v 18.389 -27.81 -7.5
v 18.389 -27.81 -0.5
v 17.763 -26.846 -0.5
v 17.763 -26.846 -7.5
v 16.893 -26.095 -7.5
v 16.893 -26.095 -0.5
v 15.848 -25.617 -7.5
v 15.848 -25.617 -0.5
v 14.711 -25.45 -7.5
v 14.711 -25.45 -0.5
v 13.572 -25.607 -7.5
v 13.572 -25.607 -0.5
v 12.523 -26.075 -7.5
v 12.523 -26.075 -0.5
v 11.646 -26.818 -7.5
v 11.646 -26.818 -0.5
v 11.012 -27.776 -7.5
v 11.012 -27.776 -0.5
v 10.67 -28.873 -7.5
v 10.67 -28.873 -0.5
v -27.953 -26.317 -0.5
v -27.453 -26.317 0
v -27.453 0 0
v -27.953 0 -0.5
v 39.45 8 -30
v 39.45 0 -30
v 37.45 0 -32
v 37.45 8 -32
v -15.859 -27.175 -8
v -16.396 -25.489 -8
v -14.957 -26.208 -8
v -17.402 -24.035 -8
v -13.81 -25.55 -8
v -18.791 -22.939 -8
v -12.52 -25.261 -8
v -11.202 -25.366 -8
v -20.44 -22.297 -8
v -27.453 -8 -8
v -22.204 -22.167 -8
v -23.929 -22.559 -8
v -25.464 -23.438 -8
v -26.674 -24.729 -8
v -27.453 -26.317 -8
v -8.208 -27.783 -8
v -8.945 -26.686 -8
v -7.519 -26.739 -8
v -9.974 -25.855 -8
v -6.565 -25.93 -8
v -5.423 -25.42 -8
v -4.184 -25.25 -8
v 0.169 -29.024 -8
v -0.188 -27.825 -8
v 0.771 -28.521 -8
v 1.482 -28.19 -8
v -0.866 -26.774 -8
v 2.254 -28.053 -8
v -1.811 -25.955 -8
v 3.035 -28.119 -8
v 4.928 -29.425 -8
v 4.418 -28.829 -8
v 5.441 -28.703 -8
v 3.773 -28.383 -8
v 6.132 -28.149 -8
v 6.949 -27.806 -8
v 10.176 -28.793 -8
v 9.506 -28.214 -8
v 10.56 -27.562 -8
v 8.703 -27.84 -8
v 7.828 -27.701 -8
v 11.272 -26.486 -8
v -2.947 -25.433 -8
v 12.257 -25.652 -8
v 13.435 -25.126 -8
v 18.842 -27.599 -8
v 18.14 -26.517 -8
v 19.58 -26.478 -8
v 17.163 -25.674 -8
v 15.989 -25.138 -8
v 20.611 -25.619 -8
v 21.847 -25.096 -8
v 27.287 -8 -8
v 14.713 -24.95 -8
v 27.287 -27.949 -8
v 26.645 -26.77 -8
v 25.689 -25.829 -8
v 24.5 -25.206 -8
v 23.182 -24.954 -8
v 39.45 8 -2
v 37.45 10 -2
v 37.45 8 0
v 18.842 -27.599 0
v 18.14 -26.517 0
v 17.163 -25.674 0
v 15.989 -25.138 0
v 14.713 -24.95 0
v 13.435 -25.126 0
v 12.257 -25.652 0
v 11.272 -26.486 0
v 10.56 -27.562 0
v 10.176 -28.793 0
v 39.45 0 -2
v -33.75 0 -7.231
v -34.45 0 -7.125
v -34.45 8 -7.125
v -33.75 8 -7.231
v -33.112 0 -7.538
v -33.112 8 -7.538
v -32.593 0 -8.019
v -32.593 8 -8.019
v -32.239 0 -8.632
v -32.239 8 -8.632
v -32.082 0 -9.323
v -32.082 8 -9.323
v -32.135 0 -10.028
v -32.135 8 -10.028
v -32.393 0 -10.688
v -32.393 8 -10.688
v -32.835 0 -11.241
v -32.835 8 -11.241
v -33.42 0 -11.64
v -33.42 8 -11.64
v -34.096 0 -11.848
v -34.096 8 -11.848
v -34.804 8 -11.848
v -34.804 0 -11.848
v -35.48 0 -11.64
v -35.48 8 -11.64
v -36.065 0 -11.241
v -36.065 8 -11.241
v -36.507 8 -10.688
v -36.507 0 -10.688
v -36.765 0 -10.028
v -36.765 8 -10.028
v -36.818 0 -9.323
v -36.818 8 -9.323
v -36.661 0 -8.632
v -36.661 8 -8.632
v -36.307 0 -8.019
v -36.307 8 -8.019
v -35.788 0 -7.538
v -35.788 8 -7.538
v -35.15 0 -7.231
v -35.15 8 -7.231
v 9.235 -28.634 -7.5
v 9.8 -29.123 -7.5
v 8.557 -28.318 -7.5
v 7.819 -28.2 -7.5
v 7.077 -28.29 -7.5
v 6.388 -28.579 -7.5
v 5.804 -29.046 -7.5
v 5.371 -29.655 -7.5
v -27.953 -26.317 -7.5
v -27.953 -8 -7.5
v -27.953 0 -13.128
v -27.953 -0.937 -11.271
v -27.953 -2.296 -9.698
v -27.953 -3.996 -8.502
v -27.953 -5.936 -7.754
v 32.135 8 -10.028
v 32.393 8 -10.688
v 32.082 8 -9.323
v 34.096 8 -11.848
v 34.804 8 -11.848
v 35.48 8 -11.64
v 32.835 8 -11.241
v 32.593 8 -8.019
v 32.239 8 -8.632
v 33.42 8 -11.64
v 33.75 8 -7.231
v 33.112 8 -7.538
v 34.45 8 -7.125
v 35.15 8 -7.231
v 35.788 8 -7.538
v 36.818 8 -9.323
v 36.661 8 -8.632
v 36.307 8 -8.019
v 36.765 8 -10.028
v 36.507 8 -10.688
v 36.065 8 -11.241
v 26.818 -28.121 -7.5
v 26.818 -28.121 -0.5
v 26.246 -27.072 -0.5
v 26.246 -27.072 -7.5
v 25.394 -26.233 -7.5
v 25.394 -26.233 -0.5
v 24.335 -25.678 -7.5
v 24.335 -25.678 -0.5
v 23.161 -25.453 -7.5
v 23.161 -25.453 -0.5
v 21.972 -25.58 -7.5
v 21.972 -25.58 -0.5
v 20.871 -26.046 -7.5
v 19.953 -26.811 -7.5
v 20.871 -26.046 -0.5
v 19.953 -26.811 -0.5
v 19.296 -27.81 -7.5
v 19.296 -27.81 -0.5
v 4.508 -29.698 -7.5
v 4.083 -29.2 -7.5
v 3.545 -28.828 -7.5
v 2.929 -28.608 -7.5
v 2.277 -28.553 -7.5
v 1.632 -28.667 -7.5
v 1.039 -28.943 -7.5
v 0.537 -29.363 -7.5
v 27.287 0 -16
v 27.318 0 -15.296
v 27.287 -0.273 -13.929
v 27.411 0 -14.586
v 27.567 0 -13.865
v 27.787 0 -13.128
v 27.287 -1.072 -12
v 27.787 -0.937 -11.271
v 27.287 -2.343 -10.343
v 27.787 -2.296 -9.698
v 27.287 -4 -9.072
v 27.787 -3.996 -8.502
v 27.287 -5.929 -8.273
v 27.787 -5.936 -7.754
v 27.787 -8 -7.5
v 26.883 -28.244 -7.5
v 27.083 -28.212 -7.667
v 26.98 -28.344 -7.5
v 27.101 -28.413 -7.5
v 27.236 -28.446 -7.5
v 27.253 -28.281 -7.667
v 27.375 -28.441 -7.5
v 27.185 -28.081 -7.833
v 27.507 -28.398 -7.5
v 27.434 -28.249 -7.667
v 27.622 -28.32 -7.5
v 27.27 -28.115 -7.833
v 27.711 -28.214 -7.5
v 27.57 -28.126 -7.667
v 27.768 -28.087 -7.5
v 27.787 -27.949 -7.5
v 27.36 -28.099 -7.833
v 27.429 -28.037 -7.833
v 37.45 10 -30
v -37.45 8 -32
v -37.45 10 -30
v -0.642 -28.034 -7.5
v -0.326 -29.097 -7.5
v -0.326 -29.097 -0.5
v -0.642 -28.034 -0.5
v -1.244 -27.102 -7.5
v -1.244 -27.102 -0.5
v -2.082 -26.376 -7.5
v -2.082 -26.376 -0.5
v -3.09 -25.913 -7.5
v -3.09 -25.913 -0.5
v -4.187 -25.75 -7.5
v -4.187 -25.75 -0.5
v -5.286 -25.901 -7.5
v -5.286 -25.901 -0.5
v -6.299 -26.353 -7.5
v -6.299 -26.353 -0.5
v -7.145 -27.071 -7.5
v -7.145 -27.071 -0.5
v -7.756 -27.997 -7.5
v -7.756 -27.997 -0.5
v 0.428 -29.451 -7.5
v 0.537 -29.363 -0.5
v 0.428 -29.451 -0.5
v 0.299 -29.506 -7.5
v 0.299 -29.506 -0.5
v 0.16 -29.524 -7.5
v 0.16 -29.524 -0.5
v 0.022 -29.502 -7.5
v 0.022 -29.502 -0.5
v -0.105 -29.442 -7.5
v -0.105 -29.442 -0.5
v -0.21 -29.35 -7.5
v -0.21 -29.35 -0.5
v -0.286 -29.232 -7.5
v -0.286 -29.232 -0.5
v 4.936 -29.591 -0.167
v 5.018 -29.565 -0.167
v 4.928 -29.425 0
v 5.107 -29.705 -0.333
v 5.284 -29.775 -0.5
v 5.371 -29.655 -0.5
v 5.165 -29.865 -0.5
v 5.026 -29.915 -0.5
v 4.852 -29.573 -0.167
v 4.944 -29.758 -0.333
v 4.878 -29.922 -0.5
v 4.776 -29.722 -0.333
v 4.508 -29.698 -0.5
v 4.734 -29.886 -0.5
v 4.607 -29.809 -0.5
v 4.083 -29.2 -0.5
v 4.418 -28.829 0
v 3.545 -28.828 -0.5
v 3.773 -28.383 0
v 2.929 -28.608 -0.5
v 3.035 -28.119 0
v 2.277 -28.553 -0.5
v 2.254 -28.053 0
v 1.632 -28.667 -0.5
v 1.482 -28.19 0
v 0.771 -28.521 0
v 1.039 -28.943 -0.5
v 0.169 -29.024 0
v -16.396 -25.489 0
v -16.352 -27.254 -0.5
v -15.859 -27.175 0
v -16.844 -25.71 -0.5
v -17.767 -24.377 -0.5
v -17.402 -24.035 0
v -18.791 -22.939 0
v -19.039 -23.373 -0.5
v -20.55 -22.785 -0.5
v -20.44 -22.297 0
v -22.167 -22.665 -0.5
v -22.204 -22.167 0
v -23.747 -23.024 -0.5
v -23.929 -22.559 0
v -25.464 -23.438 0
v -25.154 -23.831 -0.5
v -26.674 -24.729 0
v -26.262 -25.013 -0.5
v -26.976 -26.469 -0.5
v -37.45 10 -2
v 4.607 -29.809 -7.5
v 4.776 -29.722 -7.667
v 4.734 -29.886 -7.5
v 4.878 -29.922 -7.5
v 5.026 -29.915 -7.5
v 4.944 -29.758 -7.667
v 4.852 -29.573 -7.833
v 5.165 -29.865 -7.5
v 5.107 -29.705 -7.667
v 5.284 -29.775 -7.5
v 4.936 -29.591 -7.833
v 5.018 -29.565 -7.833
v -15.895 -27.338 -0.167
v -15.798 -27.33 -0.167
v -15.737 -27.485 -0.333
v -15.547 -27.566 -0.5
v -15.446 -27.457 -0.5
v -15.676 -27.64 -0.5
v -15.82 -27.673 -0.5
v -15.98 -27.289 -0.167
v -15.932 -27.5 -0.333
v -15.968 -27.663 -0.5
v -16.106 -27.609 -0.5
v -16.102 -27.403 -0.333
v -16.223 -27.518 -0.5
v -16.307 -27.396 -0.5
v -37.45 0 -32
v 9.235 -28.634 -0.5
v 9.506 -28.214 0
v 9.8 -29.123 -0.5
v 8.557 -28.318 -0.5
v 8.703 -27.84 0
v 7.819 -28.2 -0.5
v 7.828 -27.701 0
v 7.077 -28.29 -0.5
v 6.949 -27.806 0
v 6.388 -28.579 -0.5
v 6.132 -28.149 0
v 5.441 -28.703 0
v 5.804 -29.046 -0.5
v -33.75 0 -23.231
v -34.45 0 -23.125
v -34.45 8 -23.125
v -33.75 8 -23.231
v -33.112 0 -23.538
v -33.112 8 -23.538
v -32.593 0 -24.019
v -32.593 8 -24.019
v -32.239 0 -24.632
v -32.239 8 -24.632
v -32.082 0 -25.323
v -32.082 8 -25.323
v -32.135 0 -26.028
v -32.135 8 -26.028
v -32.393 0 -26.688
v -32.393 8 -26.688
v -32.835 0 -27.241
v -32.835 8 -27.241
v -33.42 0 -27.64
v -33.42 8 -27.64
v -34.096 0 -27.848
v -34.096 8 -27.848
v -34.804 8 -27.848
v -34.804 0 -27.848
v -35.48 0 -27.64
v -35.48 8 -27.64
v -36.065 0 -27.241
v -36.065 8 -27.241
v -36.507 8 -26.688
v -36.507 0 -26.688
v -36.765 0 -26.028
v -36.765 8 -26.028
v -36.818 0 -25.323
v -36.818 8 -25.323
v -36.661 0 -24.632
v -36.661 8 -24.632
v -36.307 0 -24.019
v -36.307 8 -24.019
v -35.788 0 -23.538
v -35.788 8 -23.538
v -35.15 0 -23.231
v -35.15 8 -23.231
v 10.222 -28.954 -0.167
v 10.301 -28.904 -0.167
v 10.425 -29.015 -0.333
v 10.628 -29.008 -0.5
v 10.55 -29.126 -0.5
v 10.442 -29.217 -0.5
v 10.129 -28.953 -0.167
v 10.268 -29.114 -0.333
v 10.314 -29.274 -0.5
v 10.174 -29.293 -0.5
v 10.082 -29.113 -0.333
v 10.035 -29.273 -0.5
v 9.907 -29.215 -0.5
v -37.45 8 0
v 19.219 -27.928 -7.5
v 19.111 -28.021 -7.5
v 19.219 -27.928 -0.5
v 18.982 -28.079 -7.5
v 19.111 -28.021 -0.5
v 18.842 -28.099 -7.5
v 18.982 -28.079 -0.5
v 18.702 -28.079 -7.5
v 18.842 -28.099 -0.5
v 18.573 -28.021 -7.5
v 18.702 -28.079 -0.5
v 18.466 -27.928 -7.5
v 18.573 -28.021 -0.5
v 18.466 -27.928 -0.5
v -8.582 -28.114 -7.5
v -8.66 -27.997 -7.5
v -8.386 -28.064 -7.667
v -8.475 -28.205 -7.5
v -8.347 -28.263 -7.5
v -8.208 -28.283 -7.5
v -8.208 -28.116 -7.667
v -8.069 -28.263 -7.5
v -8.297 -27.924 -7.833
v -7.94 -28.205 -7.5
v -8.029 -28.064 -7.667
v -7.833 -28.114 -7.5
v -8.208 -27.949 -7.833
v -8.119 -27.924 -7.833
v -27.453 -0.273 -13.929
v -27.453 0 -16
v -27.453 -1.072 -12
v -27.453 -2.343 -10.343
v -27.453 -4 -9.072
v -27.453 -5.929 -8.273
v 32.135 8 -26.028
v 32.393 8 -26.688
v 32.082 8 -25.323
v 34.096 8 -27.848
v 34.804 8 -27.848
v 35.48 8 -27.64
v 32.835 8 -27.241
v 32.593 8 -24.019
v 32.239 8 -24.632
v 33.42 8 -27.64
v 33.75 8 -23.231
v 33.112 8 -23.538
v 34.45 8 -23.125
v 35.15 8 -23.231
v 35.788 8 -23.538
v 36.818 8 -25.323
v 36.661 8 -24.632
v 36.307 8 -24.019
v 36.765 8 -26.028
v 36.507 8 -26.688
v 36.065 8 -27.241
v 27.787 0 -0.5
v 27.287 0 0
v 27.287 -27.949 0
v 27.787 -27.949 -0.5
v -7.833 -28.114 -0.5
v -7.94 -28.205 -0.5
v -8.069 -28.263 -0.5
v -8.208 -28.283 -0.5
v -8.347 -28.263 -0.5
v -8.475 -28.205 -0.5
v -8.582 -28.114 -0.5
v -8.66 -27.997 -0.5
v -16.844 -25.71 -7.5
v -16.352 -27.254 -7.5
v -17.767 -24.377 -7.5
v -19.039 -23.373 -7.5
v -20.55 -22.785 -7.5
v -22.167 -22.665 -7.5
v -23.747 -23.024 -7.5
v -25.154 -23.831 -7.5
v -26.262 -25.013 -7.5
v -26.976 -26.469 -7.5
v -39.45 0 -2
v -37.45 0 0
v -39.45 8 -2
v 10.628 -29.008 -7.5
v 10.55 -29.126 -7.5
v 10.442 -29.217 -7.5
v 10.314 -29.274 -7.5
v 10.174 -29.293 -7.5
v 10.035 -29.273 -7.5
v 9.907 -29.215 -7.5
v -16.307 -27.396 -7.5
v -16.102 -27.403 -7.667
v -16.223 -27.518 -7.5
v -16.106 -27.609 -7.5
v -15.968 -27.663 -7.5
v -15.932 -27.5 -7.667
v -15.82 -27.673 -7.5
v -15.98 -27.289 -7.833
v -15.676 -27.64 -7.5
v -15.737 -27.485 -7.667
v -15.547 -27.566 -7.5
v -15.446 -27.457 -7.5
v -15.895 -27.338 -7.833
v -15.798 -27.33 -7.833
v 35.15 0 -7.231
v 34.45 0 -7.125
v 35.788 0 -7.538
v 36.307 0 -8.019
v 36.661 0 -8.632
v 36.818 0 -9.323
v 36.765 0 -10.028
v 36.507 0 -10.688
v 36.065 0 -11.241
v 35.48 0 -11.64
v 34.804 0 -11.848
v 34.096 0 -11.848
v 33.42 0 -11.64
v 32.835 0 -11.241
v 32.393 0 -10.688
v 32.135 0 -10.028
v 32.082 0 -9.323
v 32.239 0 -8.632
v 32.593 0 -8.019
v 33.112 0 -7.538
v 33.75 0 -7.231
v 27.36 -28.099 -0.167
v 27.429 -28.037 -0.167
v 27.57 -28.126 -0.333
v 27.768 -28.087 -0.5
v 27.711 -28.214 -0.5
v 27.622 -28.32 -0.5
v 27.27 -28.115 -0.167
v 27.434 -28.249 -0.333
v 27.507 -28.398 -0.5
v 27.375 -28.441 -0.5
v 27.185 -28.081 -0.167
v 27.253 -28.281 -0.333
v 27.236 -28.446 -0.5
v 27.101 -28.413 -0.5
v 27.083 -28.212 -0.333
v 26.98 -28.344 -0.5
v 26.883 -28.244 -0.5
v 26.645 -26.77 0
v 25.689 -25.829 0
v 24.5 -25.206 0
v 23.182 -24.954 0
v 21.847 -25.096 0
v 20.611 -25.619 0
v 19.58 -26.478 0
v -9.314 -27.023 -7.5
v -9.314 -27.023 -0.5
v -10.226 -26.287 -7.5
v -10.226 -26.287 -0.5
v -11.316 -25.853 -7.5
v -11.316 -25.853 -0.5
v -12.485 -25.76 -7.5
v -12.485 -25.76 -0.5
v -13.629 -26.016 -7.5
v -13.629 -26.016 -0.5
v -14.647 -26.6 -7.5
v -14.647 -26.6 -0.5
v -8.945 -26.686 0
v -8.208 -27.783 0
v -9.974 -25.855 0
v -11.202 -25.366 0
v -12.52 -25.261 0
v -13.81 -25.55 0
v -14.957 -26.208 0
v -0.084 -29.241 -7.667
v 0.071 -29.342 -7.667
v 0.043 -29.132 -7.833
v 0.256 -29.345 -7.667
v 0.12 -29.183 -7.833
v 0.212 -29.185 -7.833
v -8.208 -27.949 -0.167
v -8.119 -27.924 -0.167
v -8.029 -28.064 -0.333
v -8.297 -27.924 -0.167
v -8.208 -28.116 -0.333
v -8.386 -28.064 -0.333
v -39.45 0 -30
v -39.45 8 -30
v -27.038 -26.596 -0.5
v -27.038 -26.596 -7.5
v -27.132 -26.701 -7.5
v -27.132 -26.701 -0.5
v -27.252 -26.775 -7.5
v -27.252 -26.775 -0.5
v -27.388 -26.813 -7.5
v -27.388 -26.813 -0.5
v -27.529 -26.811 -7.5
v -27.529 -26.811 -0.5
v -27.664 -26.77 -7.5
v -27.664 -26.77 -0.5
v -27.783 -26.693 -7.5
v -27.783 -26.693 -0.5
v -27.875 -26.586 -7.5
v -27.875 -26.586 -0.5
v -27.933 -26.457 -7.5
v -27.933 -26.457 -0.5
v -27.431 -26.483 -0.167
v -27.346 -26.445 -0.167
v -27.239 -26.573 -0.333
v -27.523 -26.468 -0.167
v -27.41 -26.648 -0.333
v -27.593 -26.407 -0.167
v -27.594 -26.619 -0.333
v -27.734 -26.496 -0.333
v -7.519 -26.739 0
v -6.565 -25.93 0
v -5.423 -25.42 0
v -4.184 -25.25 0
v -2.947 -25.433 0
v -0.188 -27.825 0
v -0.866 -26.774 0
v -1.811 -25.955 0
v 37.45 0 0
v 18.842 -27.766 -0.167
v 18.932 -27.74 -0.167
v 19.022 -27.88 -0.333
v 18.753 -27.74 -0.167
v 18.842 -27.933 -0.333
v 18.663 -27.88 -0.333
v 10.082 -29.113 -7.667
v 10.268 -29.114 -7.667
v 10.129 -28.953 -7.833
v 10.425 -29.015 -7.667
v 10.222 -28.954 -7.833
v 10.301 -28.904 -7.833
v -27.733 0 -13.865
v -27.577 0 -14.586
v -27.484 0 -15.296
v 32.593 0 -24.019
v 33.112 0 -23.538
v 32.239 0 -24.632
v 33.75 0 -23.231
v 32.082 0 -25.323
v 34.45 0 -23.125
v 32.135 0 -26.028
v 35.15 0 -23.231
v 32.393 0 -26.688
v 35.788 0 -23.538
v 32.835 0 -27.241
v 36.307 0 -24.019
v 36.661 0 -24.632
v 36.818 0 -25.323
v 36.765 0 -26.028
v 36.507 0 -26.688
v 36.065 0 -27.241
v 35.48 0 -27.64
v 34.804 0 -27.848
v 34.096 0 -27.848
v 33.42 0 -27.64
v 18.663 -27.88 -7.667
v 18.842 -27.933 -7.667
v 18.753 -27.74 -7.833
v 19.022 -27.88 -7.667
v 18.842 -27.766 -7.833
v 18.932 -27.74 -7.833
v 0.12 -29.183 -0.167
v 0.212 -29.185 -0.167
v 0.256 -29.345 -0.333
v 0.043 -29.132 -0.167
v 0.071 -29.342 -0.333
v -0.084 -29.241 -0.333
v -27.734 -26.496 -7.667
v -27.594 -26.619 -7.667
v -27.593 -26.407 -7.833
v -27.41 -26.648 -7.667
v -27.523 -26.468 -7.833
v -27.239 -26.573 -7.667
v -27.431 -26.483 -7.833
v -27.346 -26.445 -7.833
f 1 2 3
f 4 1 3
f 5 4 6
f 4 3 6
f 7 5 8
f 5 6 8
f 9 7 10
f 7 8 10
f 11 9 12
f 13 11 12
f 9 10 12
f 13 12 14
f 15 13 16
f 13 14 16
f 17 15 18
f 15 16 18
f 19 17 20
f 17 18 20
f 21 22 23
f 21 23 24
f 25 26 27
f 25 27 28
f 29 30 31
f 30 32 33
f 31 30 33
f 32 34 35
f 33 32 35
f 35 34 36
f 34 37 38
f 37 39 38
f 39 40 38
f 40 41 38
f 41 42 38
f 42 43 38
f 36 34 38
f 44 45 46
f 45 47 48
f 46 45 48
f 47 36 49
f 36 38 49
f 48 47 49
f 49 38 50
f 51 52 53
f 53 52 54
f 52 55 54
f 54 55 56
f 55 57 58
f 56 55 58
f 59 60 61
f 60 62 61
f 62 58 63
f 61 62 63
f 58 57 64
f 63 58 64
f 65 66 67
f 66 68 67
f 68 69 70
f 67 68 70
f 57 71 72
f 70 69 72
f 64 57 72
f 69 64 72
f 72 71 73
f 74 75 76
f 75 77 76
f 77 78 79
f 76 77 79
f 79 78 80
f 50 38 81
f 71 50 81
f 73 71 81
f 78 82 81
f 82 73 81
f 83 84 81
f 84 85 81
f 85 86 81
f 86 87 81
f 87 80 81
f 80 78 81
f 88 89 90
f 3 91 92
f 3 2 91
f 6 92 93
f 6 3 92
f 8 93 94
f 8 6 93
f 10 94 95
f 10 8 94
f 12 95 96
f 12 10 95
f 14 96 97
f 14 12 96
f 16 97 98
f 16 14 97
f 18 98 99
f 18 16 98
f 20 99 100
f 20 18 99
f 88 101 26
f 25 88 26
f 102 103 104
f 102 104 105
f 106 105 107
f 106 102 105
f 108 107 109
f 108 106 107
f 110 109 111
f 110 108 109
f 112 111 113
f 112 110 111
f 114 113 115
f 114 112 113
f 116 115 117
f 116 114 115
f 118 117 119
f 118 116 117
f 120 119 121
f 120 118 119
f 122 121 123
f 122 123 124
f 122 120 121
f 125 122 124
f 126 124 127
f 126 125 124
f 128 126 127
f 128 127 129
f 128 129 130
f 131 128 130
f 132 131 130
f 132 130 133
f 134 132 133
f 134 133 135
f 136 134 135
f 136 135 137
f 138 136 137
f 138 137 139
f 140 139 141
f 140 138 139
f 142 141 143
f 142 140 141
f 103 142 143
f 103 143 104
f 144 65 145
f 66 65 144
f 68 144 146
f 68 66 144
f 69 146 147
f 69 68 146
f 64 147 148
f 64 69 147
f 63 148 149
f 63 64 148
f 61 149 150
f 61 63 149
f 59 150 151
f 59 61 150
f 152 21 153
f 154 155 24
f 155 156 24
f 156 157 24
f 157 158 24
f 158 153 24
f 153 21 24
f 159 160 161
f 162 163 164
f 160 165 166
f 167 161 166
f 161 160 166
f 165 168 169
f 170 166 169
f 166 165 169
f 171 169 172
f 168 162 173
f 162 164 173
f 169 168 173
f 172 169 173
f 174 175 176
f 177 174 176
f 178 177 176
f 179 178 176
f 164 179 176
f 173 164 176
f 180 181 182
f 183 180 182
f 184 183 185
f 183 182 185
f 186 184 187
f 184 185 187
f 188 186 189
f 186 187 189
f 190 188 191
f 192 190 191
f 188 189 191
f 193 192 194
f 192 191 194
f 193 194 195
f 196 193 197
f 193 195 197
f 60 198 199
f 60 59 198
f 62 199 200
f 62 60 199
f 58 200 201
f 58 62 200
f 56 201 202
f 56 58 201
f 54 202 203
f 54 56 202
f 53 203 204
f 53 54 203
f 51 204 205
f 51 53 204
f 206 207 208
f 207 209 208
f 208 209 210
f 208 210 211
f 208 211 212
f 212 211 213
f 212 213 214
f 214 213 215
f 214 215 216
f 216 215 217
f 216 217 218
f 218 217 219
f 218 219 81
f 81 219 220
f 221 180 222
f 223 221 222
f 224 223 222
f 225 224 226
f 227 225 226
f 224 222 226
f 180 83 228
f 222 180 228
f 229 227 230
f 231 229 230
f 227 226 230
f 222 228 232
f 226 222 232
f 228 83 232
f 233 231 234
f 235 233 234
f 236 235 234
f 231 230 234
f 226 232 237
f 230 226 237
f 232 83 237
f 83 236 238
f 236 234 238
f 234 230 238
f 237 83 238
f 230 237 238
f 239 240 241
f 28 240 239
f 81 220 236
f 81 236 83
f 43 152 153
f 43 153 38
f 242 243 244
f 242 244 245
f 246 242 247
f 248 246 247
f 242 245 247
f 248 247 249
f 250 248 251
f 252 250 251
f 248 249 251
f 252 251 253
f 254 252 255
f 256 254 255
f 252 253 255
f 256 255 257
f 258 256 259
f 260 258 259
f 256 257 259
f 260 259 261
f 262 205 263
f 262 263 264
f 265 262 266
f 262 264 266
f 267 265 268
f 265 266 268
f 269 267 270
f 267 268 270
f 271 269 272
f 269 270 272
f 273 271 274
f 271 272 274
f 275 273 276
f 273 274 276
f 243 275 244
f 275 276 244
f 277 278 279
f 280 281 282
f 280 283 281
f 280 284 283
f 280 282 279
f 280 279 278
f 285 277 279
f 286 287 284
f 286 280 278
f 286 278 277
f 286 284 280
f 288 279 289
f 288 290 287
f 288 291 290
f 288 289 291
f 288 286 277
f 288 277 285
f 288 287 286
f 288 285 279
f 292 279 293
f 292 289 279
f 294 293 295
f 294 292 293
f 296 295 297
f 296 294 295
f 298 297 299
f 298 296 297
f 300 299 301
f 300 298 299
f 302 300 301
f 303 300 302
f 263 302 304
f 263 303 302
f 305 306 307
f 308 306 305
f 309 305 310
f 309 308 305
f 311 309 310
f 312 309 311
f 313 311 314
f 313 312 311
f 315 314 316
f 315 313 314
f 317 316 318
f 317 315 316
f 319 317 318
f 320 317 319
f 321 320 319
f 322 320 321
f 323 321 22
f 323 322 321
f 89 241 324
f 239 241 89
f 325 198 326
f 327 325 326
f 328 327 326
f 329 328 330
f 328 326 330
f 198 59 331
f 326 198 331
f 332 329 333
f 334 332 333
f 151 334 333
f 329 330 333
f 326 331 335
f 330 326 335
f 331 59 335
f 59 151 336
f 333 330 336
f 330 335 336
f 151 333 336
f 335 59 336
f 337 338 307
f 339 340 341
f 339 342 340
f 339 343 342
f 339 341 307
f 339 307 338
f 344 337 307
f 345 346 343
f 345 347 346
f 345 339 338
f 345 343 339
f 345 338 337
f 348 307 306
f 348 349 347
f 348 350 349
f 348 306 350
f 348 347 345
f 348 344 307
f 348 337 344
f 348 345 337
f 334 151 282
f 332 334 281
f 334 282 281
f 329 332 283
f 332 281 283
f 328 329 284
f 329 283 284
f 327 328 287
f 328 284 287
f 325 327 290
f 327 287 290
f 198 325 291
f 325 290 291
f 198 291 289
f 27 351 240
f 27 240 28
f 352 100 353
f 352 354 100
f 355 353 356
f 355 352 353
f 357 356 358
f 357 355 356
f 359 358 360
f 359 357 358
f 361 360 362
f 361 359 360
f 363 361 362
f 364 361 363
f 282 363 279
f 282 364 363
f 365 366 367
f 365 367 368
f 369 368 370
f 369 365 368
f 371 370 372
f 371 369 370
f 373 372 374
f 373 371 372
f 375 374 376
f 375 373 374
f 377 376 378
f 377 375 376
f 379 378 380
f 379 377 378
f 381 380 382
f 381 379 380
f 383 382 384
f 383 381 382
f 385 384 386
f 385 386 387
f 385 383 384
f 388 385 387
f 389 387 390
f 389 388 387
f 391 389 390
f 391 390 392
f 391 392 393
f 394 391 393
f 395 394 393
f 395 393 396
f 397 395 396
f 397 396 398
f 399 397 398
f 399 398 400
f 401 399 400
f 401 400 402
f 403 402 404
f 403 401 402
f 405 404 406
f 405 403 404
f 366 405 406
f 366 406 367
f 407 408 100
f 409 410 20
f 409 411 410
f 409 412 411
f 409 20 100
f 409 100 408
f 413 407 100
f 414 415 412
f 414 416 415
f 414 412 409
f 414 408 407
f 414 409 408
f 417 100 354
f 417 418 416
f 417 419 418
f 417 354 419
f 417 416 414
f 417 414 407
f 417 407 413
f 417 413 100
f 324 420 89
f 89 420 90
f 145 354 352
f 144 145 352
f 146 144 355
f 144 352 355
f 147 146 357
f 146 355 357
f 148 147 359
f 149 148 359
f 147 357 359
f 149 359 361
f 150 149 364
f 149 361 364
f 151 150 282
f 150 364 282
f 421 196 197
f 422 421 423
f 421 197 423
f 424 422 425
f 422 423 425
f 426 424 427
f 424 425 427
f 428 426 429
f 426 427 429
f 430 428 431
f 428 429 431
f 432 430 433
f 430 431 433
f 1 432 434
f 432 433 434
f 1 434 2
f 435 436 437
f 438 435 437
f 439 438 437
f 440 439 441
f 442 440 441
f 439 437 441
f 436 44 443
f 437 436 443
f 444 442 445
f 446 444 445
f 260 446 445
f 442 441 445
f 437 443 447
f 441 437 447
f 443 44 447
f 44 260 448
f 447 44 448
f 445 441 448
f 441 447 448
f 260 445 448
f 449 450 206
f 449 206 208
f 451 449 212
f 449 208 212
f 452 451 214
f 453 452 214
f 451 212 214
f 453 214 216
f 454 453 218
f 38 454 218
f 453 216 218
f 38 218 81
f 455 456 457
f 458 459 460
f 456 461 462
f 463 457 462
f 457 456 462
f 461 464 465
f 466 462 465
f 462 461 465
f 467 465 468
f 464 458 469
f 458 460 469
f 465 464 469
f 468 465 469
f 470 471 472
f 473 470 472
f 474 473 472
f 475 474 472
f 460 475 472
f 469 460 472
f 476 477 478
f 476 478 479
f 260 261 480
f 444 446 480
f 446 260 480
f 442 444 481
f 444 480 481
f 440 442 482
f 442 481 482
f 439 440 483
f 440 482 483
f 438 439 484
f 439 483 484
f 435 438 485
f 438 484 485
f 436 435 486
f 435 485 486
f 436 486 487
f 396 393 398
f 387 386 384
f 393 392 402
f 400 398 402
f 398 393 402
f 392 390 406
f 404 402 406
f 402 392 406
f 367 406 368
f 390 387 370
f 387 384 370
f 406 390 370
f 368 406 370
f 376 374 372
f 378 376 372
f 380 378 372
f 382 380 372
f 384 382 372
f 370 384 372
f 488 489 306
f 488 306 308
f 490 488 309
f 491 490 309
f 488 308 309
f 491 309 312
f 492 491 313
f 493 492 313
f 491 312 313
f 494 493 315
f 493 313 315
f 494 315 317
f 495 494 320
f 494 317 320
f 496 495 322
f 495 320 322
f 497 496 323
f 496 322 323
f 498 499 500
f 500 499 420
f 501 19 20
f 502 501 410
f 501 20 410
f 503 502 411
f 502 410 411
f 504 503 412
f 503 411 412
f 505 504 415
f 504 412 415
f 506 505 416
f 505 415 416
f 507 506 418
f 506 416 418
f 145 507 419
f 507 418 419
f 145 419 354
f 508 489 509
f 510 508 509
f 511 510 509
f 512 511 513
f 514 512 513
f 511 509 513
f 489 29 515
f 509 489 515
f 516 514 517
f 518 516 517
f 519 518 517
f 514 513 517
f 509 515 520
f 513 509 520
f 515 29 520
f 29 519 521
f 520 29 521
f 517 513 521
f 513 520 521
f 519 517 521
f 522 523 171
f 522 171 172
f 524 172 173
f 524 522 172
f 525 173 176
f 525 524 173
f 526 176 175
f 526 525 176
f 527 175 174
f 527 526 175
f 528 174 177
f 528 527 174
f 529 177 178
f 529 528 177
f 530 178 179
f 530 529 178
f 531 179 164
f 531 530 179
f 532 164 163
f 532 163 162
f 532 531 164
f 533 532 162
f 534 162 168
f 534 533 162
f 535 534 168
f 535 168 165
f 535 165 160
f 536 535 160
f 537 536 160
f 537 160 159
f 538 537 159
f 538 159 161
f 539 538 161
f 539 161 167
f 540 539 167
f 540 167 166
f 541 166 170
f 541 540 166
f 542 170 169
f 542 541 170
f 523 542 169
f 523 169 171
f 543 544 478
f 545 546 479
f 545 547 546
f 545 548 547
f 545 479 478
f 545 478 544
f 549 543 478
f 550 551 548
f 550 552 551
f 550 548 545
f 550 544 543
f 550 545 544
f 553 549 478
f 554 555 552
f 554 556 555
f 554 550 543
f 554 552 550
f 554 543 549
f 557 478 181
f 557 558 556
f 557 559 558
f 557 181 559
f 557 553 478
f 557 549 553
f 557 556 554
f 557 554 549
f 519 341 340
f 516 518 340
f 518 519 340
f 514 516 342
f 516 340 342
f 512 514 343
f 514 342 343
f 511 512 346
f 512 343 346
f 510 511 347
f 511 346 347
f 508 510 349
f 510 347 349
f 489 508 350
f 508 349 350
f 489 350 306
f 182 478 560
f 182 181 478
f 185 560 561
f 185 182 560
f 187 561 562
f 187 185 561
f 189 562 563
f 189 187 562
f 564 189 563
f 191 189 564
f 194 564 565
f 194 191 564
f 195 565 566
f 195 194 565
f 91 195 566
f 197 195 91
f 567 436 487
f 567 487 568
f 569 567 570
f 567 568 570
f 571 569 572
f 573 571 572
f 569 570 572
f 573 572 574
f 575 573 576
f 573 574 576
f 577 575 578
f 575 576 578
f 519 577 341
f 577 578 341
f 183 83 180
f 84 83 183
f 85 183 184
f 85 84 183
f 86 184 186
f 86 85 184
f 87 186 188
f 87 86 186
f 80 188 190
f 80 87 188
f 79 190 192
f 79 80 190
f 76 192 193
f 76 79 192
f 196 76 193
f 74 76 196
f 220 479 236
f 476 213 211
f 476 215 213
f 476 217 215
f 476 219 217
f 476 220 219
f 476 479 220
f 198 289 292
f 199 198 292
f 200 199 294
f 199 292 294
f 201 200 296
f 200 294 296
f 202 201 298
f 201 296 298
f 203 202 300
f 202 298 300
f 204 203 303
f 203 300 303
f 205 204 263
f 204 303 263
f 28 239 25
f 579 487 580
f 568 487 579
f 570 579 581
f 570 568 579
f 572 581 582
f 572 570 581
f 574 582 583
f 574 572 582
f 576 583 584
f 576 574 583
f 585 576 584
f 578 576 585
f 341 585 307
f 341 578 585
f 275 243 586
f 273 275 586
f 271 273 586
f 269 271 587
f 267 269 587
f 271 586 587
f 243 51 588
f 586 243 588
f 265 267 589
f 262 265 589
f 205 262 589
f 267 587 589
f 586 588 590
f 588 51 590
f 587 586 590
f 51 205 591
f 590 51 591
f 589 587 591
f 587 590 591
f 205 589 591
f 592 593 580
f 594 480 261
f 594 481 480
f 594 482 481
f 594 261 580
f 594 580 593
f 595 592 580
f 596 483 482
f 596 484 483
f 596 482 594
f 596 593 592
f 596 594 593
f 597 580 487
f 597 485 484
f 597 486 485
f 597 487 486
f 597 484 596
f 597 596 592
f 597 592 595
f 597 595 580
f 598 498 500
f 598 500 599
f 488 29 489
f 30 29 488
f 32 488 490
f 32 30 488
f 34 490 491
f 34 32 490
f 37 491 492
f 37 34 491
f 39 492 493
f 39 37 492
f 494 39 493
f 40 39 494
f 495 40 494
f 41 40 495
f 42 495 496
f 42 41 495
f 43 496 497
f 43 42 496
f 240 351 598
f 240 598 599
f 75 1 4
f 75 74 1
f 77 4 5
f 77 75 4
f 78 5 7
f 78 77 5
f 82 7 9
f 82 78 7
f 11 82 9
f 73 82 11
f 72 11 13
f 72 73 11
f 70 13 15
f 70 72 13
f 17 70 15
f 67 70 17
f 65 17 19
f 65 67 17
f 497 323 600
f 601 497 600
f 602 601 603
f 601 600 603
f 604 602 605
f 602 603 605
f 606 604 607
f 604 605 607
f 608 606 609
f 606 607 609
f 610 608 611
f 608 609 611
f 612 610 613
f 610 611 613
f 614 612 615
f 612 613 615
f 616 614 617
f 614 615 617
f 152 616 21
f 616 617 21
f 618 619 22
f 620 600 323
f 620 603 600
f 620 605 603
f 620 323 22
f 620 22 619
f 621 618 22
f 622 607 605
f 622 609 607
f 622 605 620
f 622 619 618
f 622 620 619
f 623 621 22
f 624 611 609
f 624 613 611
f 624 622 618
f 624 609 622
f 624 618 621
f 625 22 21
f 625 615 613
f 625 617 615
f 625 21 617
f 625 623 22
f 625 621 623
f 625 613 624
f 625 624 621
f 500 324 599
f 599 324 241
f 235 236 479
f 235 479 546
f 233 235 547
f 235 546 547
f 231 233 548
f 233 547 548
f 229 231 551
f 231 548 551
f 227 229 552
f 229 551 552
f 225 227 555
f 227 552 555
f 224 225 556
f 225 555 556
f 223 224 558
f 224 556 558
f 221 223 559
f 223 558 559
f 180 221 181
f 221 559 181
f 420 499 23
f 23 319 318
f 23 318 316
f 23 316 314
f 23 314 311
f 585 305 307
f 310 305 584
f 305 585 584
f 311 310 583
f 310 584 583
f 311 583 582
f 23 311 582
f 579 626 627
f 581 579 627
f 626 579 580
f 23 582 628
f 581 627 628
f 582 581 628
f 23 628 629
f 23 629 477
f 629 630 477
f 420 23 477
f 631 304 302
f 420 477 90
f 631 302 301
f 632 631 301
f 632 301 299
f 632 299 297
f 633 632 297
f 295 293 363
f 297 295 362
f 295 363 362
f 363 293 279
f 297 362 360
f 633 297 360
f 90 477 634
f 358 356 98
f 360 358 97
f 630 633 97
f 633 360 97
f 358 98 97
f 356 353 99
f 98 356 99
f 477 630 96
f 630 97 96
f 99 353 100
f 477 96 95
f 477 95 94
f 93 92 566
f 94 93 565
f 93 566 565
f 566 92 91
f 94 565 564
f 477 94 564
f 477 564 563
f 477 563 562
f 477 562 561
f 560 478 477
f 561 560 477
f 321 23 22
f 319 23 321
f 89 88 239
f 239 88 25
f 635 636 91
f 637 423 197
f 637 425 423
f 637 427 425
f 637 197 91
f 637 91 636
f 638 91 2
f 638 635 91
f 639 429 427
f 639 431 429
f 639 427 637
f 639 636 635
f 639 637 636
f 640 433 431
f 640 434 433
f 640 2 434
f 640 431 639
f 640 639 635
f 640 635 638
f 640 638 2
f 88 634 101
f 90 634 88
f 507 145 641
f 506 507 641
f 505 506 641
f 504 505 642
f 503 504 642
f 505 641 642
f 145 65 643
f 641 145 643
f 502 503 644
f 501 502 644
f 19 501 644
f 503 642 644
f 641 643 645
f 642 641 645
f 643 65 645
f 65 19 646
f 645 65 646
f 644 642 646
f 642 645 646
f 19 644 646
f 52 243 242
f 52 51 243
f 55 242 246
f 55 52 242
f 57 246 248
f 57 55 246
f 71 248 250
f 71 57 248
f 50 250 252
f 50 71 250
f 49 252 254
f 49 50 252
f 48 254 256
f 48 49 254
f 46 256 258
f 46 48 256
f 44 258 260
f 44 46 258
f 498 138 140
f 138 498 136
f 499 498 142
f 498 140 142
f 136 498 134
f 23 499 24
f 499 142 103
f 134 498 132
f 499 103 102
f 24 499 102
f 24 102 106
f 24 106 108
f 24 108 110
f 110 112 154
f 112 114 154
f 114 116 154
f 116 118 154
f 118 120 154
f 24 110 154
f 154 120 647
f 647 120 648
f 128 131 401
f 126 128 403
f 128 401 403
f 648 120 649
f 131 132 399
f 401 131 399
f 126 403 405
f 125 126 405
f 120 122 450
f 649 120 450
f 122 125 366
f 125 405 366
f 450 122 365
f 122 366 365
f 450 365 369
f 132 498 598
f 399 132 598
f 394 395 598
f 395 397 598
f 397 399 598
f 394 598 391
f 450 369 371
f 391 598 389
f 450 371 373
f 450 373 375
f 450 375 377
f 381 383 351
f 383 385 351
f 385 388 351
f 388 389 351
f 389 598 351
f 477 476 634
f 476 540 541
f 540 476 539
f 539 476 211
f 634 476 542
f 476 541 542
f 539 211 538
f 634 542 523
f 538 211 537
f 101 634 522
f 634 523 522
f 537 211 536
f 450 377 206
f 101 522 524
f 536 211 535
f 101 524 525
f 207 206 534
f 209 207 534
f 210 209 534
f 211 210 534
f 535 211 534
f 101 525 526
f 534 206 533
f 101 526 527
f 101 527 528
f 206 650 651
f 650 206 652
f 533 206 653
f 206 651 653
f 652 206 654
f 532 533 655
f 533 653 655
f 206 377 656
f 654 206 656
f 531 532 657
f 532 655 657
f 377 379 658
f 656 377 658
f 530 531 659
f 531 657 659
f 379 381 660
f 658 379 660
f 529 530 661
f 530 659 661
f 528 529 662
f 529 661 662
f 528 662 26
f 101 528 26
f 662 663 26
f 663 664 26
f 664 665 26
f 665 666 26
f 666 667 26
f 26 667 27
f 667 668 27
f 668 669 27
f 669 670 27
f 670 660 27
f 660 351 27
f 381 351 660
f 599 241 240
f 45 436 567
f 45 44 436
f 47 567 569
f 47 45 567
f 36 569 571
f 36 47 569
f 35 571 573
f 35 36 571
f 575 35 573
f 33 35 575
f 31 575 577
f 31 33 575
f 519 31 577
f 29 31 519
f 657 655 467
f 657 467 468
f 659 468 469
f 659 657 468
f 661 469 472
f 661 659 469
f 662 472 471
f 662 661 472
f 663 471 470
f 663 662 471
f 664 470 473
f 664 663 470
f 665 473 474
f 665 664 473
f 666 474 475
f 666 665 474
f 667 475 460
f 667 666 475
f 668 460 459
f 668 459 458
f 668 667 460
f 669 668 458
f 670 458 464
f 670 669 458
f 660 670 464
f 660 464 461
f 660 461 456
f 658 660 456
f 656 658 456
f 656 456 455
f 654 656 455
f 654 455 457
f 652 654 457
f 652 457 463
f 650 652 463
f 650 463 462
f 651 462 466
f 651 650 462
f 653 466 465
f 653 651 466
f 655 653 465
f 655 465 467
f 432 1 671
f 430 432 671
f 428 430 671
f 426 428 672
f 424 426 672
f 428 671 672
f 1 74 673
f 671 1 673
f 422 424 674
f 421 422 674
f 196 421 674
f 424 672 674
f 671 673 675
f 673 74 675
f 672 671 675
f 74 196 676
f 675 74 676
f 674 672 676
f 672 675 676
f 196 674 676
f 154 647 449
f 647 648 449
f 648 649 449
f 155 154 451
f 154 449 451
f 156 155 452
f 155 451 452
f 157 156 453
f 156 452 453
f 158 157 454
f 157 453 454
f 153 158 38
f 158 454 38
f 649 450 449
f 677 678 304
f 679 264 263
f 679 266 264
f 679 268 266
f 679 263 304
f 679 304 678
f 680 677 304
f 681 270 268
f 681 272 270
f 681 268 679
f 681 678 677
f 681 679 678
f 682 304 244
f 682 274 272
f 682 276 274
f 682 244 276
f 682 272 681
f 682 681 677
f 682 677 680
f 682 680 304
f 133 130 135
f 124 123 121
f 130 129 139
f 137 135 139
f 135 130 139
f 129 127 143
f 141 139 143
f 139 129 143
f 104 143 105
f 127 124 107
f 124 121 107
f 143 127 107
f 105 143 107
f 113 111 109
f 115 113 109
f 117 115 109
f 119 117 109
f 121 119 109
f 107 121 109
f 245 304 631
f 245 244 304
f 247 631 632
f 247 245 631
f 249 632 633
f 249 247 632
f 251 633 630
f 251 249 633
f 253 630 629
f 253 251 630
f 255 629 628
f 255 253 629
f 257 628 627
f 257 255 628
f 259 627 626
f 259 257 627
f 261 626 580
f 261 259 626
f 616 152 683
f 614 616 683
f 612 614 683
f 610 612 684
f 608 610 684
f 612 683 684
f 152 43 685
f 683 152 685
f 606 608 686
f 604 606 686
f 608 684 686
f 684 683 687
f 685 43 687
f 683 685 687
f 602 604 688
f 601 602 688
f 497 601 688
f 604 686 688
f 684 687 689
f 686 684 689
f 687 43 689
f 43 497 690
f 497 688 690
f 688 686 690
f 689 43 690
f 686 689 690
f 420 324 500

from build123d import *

# Parameters (mm, degrees)
SKETCH3_W           = 78.9
SKETCH3_H           = 32
BOSS_EXTRUDE1_DEPTH = 10
SKETCH3_4_R         = 2.375
CUT_EXTRUDE1_DEPTH  = 8
SKETCH4_W           = 55.74
SKETCH4_H           = 33.5
BOSS_EXTRUDE2_DEPTH = 8
CUT_EXTRUDE2_REACH  = 62.849
FILLET1_R           = 8
CHAMFER1_SIZE       = 2
CHAMFER2_SIZE       = 0.5


with BuildPart() as part:
    # Sketch3 → Boss-Extrude1 (new body)
    with BuildSketch(Plane(origin=(0, 0, 0), x_dir=(1, 0, 0), z_dir=(0, 1, 0))):
        with Locations((0, 16)):
            Rectangle(SKETCH3_W, SKETCH3_H)
    extrude(amount=BOSS_EXTRUDE1_DEPTH)

    # Sketch3<4> → Cut-Extrude1 (cut)
    with BuildSketch(Plane(origin=(0, 0, 0), x_dir=(1, 0, 0), z_dir=(0, 1, 0))):
        with Locations(Location((-34.45, 9.5, 0), (0, 0, 270))):
            Circle(SKETCH3_4_R)
        with Locations(Location((34.45, 9.5, 0), (0, 0, 270))):
            Circle(SKETCH3_4_R)
        with Locations(Location((-34.45, 25.5, 0), (0, 0, 270))):
            Circle(SKETCH3_4_R)
        with Locations(Location((34.45, 25.5, 0), (0, 0, 270))):
            Circle(SKETCH3_4_R)
    extrude(amount=CUT_EXTRUDE1_DEPTH, mode=Mode.SUBTRACT)

    # Sketch4 → Boss-Extrude2 (add)
    with BuildSketch(Plane.XY):
        with Locations((-0.082754798, -16.75)):
            Rectangle(SKETCH4_W, SKETCH4_H)
    extrude(amount=-BOSS_EXTRUDE2_DEPTH)

    # Sketch6 → Cut-Extrude2 (cut, up to next)
    with BuildSketch(Plane.XY, mode=Mode.PRIVATE) as cut_extrude2_sk1:
        with BuildLine():
            Line((-27.952754798, -33.5), (27.787245202, -33.5))
            Line((27.787245202, -33.5), (27.787245202, -27.949055839))
            ThreePointArc((27.787245202, -27.949055839), (27.374711042, -28.441346126), (26.817846295, -28.121290173))
            ThreePointArc((26.817846295, -28.121290173), (23.160845315, -25.453489346), (19.295797115, -27.809804228))
            ThreePointArc((19.295797115, -27.809804228), (18.842245202, -28.099350759), (18.388693289, -27.809804228))
            ThreePointArc((18.388693289, -27.809804228), (14.135992665, -25.488143783), (10.669672877, -28.873435048))
            ThreePointArc((10.669672877, -28.873435048), (10.313792265, -29.274157145), (9.799721264, -29.122630861))
            ThreePointArc((9.799721264, -29.122630861), (7.44477434, -28.219326103), (5.371236745, -29.655354078))
            ThreePointArc((5.371236745, -29.655354078), (4.951993147, -29.92426536), (4.508475892, -29.697613829))
            ThreePointArc((4.508475892, -29.697613829), (2.60438519, -28.558927341), (0.536516234, -29.362722278))
            ThreePointArc((0.536516234, -29.362722278), (0.021886532, -29.501511273), (-0.325508515, -29.097255418))
            ThreePointArc((-0.325508515, -29.097255418), (-3.632594875, -25.792369955), (-7.755777397, -27.996560058))
            ThreePointArc((-7.755777397, -27.996560058), (-8.207754798, -28.282746053), (-8.659732199, -27.996560058))
            ThreePointArc((-8.659732199, -27.996560058), (-11.896894258, -25.762329464), (-15.446236111, -27.45737429))
            ThreePointArc((-15.446236111, -27.45737429), (-15.968076529, -27.66278259), (-16.352419433, -27.254382635))
            ThreePointArc((-16.352419433, -27.254382635), (-21.353910692, -22.664914384), (-26.97618576, -26.468617408))
            ThreePointArc((-26.97618576, -26.468617408), (-27.529290676, -26.81145713), (-27.952754798, -26.317349591))
            Line((-27.952754798, -26.317349591), (-27.952754798, -33.5))
        make_face()
    cut_extrude2_tool1 = extrude(cut_extrude2_sk1.sketch, amount=-CUT_EXTRUDE2_REACH, mode=Mode.PRIVATE) & part.part
    add(cut_extrude2_tool1.solids().sort_by_distance((-1.952714, -29.732571, 0))[0], mode=Mode.SUBTRACT)

    # Fillet1
    fillet1_edges = [part.edges().sort_by_distance(p)[0] for p in [
        (-0.082754798, 0, -8),
    ]]
    fillet(fillet1_edges, radius=FILLET1_R)

    # Chamfer1
    chamfer1_edges = [part.edges().sort_by_distance(p)[0] for p in [
        (39.45, 10, -16),
        (0, 10, 0),
        (-39.45, 10, -16),
        (0, 10, -32),
        (-39.45, 5, 0),
        (39.45, 5, 0),
        (39.45, 5, -32),
        (-39.45, 5, -32),
    ]]
    chamfer(chamfer1_edges, length=CHAMFER1_SIZE)

    # Chamfer2
    # the kernel refuses this chamfer: 0.5 mm, written as the material it takes off along each edge
    with BuildSketch(Plane(origin=(-27.952754798, -26.317349591, 0), x_dir=(1, 0, 0), z_dir=(0, 1, 0))) as chamfer2_piece_1:
        Polygon((CHAMFER2_SIZE, 0), (0, CHAMFER2_SIZE), (0, 0), align=None)
    extrude(amount=26.317349591, mode=Mode.SUBTRACT)
    with BuildSketch(Plane(origin=(27.787245202, -8, -8), x_dir=(0, 0, 1), z_dir=(0, -1, 0))) as chamfer2_piece_2:
        Polygon((CHAMFER2_SIZE, 0), (0, CHAMFER2_SIZE), (0, 0), align=None)
    extrude(amount=19.949055839, mode=Mode.SUBTRACT)
    with BuildSketch(Plane(origin=(27.787245202, 0, 0), x_dir=(-1, 0, 0), z_dir=(0, -1, 0))) as chamfer2_piece_3:
        Polygon((CHAMFER2_SIZE, 0), (0, CHAMFER2_SIZE), (0, 0), align=None)
    extrude(amount=27.949055839, mode=Mode.SUBTRACT)
    with BuildSketch(Plane(origin=(-15.858781501, -27.1748742, -8), x_dir=(-0.987275865677397, -0.15901687033439718, 0), z_dir=(-0.15901687033439718, 0.987275865677397, 0))) as chamfer2_piece_4:
        Polygon((0.5, CHAMFER2_SIZE), (0.5 - CHAMFER2_SIZE, 0), (0.5, 0), align=None)
    revolve(axis=Axis((-15.858781501, -27.1748742, -8), (0, 0, 1)), revolution_arc=136.447859655, mode=Mode.SUBTRACT)
    with BuildSketch(Plane(origin=(-12.207754798, -29.675, -8), x_dir=(0.9039548022598873, 0.4276280106252253, 0), z_dir=(0.4276280106252253, -0.9039548022598873, 0))) as chamfer2_piece_5:
        Polygon((3.925, CHAMFER2_SIZE), (3.925 + CHAMFER2_SIZE, 0), (3.925, 0), align=None)
    revolve(axis=Axis((-12.207754798, -29.675, -8), (0, 0, 1)), revolution_arc=120.280574477, mode=Mode.SUBTRACT)
    with BuildSketch(Plane(origin=(-8.207754798, -27.782746053, -8), x_dir=(-0.9039548022598843, -0.427628010625232, 0), z_dir=(-0.427628010625232, 0.9039548022598843, 0))) as chamfer2_piece_6:
        Polygon((0.5, CHAMFER2_SIZE), (0.5 - CHAMFER2_SIZE, 0), (0.5, 0), align=None)
    revolve(axis=Axis((-8.207754798, -27.782746053, -8), (0, 0, 1)), revolution_arc=129.365756689, mode=Mode.SUBTRACT)
    with BuildSketch(Plane(origin=(-4.207754798, -29.675, -8), x_dir=(0.9891073331389847, 0.1471960717230098, 0), z_dir=(0.1471960717230098, -0.9891073331389847, 0))) as chamfer2_piece_7:
        Polygon((3.925, CHAMFER2_SIZE), (3.925 + CHAMFER2_SIZE, 0), (3.925, 0), align=None)
    revolve(axis=Axis((-4.207754798, -29.675, -8), (0, 0, 1)), revolution_arc=146.218408748, mode=Mode.SUBTRACT)
    with BuildSketch(Plane(origin=(0.169045151, -29.023657383, -8), x_dir=(-0.989107333138985, -0.14719607172300886, 0), z_dir=(-0.14719607172300886, 0.989107333138985, 0))) as chamfer2_piece_8:
        Polygon((0.5, CHAMFER2_SIZE), (0.5 - CHAMFER2_SIZE, 0), (0.5, 0), align=None)
    revolve(axis=Axis((0.169045151, -29.023657383, -8), (0, 0, 1)), revolution_arc=128.837859802, mode=Mode.SUBTRACT)
    with BuildSketch(Plane(origin=(2.392245202, -31.075, -8), x_dir=(0.8381111645487582, 0.5454994737474312, 0), z_dir=(0.5454994737474312, -0.8381111645487582, 0))) as chamfer2_piece_9:
        Polygon((2.525, CHAMFER2_SIZE), (2.525 + CHAMFER2_SIZE, 0), (2.525, 0), align=None)
    revolve(axis=Axis((2.392245202, -31.075, -8), (0, 0, 1)), revolution_arc=104.243526868, mode=Mode.SUBTRACT)
    with BuildSketch(Plane(origin=(4.927531475, -29.424864092, -8), x_dir=(-0.8381111645487566, -0.5454994737474338, 0), z_dir=(-0.5454994737474338, 0.8381111645487566, 0))) as chamfer2_piece_10:
        Polygon((0.5, CHAMFER2_SIZE), (0.5 - CHAMFER2_SIZE, 0), (0.5, 0), align=None)
    revolve(axis=Axis((4.927531475, -29.424864092, -8), (0, 0, 1)), revolution_arc=119.490836117, mode=Mode.SUBTRACT)
    with BuildSketch(Plane(origin=(7.767245202, -30.9, -8), x_dir=(0.7527689119185456, 0.6582848663374914, 0), z_dir=(0.6582848663374914, -0.7527689119185456, 0))) as chamfer2_piece_11:
        Polygon((2.7, CHAMFER2_SIZE), (2.7 + CHAMFER2_SIZE, 0), (2.7, 0), align=None)
    revolve(axis=Axis((7.767245202, -30.9, -8), (0, 0, 1)), revolution_arc=111.380440885, mode=Mode.SUBTRACT)
    with BuildSketch(Plane(origin=(10.17610572, -28.793488428, -8), x_dir=(-0.7527689119185441, -0.6582848663374932, 0), z_dir=(-0.6582848663374932, 0.7527689119185441, 0))) as chamfer2_piece_12:
        Polygon((0.5, CHAMFER2_SIZE), (0.5 - CHAMFER2_SIZE, 0), (0.5, 0), align=None)
    revolve(axis=Axis((10.17610572, -28.793488428, -8), (0, 0, 1)), revolution_arc=129.630102702, mode=Mode.SUBTRACT)
    with BuildSketch(Plane(origin=(14.692245202, -29.525, -8), x_dir=(0.9071038251366096, 0.42090693795960527, 0), z_dir=(0.42090693795960527, -0.9071038251366096, 0))) as chamfer2_piece_13:
        Polygon((4.075, CHAMFER2_SIZE), (4.075 + CHAMFER2_SIZE, 0), (4.075, 0), align=None)
    revolve(axis=Axis((14.692245202, -29.525, -8), (0, 0, 1)), revolution_arc=145.907440943, mode=Mode.SUBTRACT)
    with BuildSketch(Plane(origin=(18.842245202, -27.599350759, -8), x_dir=(-0.9071038251366129, -0.4209069379595987, 0), z_dir=(-0.4209069379595987, 0.9071038251366129, 0))) as chamfer2_piece_14:
        Polygon((0.5, CHAMFER2_SIZE), (0.5 - CHAMFER2_SIZE, 0), (0.5, 0), align=None)
    revolve(axis=Axis((18.842245202, -27.599350759, -8), (0, 0, 1)), revolution_arc=130.21628096, mode=Mode.SUBTRACT)
    with BuildSketch(Plane(origin=(22.992245202, -29.525, -8), x_dir=(0.9387978142076504, 0.3444686691688196, 0), z_dir=(0.3444686691688196, -0.9387978142076504, 0))) as chamfer2_piece_15:
        Polygon((4.075, CHAMFER2_SIZE), (4.075 + CHAMFER2_SIZE, 0), (4.075, 0), align=None)
    revolve(axis=Axis((22.992245202, -29.525, -8), (0, 0, 1)), revolution_arc=134.95877574, mode=Mode.SUBTRACT)
    with BuildSketch(Plane(origin=(27.287245202, -27.949055839, -8), x_dir=(-0.9387978142076511, -0.3444686691688182, 0), z_dir=(-0.3444686691688182, 0.9387978142076511, 0))) as chamfer2_piece_16:
        Polygon((0.5, CHAMFER2_SIZE), (0.5 - CHAMFER2_SIZE, 0), (0.5, 0), align=None)
    revolve(axis=Axis((27.287245202, -27.949055839, -8), (0, 0, 1)), revolution_arc=159.85063526, mode=Mode.SUBTRACT)
    with BuildSketch(Plane(origin=(-27.452754798, -26.317349591, -8), x_dir=(-1, 0, 0), z_dir=(0, 1, 0))) as chamfer2_piece_17:
        Polygon((0.5, CHAMFER2_SIZE), (0.5 - CHAMFER2_SIZE, 0), (0.5, 0), align=None)
    revolve(axis=Axis((-27.452754798, -26.317349591, -8), (0, 0, 1)), revolution_arc=162.390037032, mode=Mode.SUBTRACT)
    with BuildSketch(Plane(origin=(-21.757754798, -28.125, -8), x_dir=(0.9872758656773971, 0.1590168703343955, 0), z_dir=(0.1590168703343955, -0.9872758656773971, 0))) as chamfer2_piece_18:
        Polygon((5.475, CHAMFER2_SIZE), (5.475 + CHAMFER2_SIZE, 0), (5.475, 0), align=None)
    revolve(axis=Axis((-21.757754798, -28.125, -8), (0, 0, 1)), revolution_arc=153.240200555, mode=Mode.SUBTRACT)
    with BuildSketch(Plane(origin=(-15.858781501, -27.1748742, 0), x_dir=(0.8250907802435141, -0.5650001808470059, 0), z_dir=(0.5650001808470059, 0.8250907802435141, 0))) as chamfer2_piece_19:
        Polygon((0.5 - CHAMFER2_SIZE, 0), (0.5, CHAMFER2_SIZE), (0.5, 0), align=None)
    revolve(axis=Axis((-15.858781501, -27.1748742, 0), (0, 0, -1)), revolution_arc=136.447859655, mode=Mode.SUBTRACT)
    with BuildSketch(Plane(origin=(-21.757754798, -28.125, 0), x_dir=(0.9872758656773971, 0.1590168703343955, 0), z_dir=(0.1590168703343955, -0.9872758656773971, 0))) as chamfer2_piece_20:
        Polygon((5.475 + CHAMFER2_SIZE, 0), (5.475, -CHAMFER2_SIZE), (5.475, 0), align=None)
    revolve(axis=Axis((-21.757754798, -28.125, 0), (0, 0, 1)), revolution_arc=153.240200555, mode=Mode.SUBTRACT)
    with BuildSketch(Plane(origin=(-27.452754798, -26.317349591, 0), x_dir=(0.9531380753138083, -0.3025356332518353, 0), z_dir=(0.3025356332518353, 0.9531380753138083, 0))) as chamfer2_piece_21:
        Polygon((0.5 - CHAMFER2_SIZE, 0), (0.5, CHAMFER2_SIZE), (0.5, 0), align=None)
    revolve(axis=Axis((-27.452754798, -26.317349591, 0), (0, 0, -1)), revolution_arc=162.390037032, mode=Mode.SUBTRACT)
    with BuildSketch(Plane(origin=(27.287245202, -27.949055839, 0), x_dir=(1, 0, 0), z_dir=(0, 1, 0))) as chamfer2_piece_22:
        Polygon((0.5 - CHAMFER2_SIZE, 0), (0.5, CHAMFER2_SIZE), (0.5, 0), align=None)
    revolve(axis=Axis((27.287245202, -27.949055839, 0), (0, 0, -1)), revolution_arc=159.85063526, mode=Mode.SUBTRACT)
    with BuildSketch(Plane(origin=(22.992245202, -29.525, 0), x_dir=(0.9387978142076504, 0.3444686691688196, 0), z_dir=(0.3444686691688196, -0.9387978142076504, 0))) as chamfer2_piece_23:
        Polygon((4.075 + CHAMFER2_SIZE, 0), (4.075, -CHAMFER2_SIZE), (4.075, 0), align=None)
    revolve(axis=Axis((22.992245202, -29.525, 0), (0, 0, 1)), revolution_arc=134.95877574, mode=Mode.SUBTRACT)
    with BuildSketch(Plane(origin=(18.842245202, -27.599350759, 0), x_dir=(0.9071038251366116, -0.4209069379596014, 0), z_dir=(0.4209069379596014, 0.9071038251366116, 0))) as chamfer2_piece_24:
        Polygon((0.5 - CHAMFER2_SIZE, 0), (0.5, CHAMFER2_SIZE), (0.5, 0), align=None)
    revolve(axis=Axis((18.842245202, -27.599350759, 0), (0, 0, -1)), revolution_arc=130.21628096, mode=Mode.SUBTRACT)
    with BuildSketch(Plane(origin=(14.692245202, -29.525, 0), x_dir=(0.9071038251366096, 0.42090693795960527, 0), z_dir=(0.42090693795960527, -0.9071038251366096, 0))) as chamfer2_piece_25:
        Polygon((4.075 + CHAMFER2_SIZE, 0), (4.075, -CHAMFER2_SIZE), (4.075, 0), align=None)
    revolve(axis=Axis((14.692245202, -29.525, 0), (0, 0, 1)), revolution_arc=145.907440943, mode=Mode.SUBTRACT)
    with BuildSketch(Plane(origin=(10.17610572, -28.793488428, 0), x_dir=(0.9871343129750032, -0.15989323984261683, 0), z_dir=(0.15989323984261683, 0.9871343129750032, 0))) as chamfer2_piece_26:
        Polygon((0.5 - CHAMFER2_SIZE, 0), (0.5, CHAMFER2_SIZE), (0.5, 0), align=None)
    revolve(axis=Axis((10.17610572, -28.793488428, 0), (0, 0, -1)), revolution_arc=129.630102702, mode=Mode.SUBTRACT)
    with BuildSketch(Plane(origin=(7.767245202, -30.9, 0), x_dir=(0.7527689119185456, 0.6582848663374914, 0), z_dir=(0.6582848663374914, -0.7527689119185456, 0))) as chamfer2_piece_27:
        Polygon((2.7 + CHAMFER2_SIZE, 0), (2.7, -CHAMFER2_SIZE), (2.7, 0), align=None)
    revolve(axis=Axis((7.767245202, -30.9, 0), (0, 0, 1)), revolution_arc=111.380440885, mode=Mode.SUBTRACT)
    with BuildSketch(Plane(origin=(4.927531475, -29.424864092, 0), x_dir=(0.8874105397625023, -0.4609799712768705, 0), z_dir=(0.4609799712768705, 0.8874105397625023, 0))) as chamfer2_piece_28:
        Polygon((0.5 - CHAMFER2_SIZE, 0), (0.5, CHAMFER2_SIZE), (0.5, 0), align=None)
    revolve(axis=Axis((4.927531475, -29.424864092, 0), (0, 0, -1)), revolution_arc=119.490836117, mode=Mode.SUBTRACT)
    with BuildSketch(Plane(origin=(2.392245202, -31.075, 0), x_dir=(0.8381111645487582, 0.5454994737474312, 0), z_dir=(0.5454994737474312, -0.8381111645487582, 0))) as chamfer2_piece_29:
        Polygon((2.525 + CHAMFER2_SIZE, 0), (2.525, -CHAMFER2_SIZE), (2.525, 0), align=None)
    revolve(axis=Axis((2.392245202, -31.075, 0), (0, 0, 1)), revolution_arc=104.243526868, mode=Mode.SUBTRACT)
    with BuildSketch(Plane(origin=(0.169045151, -29.023657383, 0), x_dir=(0.734942165573552, -0.6781297908675433, 0), z_dir=(0.6781297908675433, 0.734942165573552, 0))) as chamfer2_piece_30:
        Polygon((0.5 - CHAMFER2_SIZE, 0), (0.5, CHAMFER2_SIZE), (0.5, 0), align=None)
    revolve(axis=Axis((0.169045151, -29.023657383, 0), (0, 0, -1)), revolution_arc=128.837859802, mode=Mode.SUBTRACT)
    with BuildSketch(Plane(origin=(-4.207754798, -29.675, 0), x_dir=(0.9891073331389847, 0.1471960717230098, 0), z_dir=(0.1471960717230098, -0.9891073331389847, 0))) as chamfer2_piece_31:
        Polygon((3.925 + CHAMFER2_SIZE, 0), (3.925, -CHAMFER2_SIZE), (3.925, 0), align=None)
    revolve(axis=Axis((-4.207754798, -29.675, 0), (0, 0, 1)), revolution_arc=146.218408748, mode=Mode.SUBTRACT)
    with BuildSketch(Plane(origin=(-8.207754798, -27.782746053, 0), x_dir=(0.9039548022598843, -0.427628010625232, 0), z_dir=(0.427628010625232, 0.9039548022598843, 0))) as chamfer2_piece_32:
        Polygon((0.5 - CHAMFER2_SIZE, 0), (0.5, CHAMFER2_SIZE), (0.5, 0), align=None)
    revolve(axis=Axis((-8.207754798, -27.782746053, 0), (0, 0, -1)), revolution_arc=129.365756689, mode=Mode.SUBTRACT)
    with BuildSketch(Plane(origin=(-12.207754798, -29.675, 0), x_dir=(0.9039548022598873, 0.4276280106252253, 0), z_dir=(0.4276280106252253, -0.9039548022598873, 0))) as chamfer2_piece_33:
        Polygon((3.925 + CHAMFER2_SIZE, 0), (3.925, -CHAMFER2_SIZE), (3.925, 0), align=None)
    revolve(axis=Axis((-12.207754798, -29.675, 0), (0, 0, 1)), revolution_arc=120.280574477, mode=Mode.SUBTRACT)
    with BuildSketch(Plane(origin=(-27.952754798, -26.317349591, -8), x_dir=(0, 0, 1), z_dir=(0, 1, 0))) as chamfer2_piece_34:
        Polygon((CHAMFER2_SIZE, 0), (0, CHAMFER2_SIZE), (0, 0), align=None)
    extrude(amount=18.317349591, mode=Mode.SUBTRACT)
    with BuildSketch(Plane(origin=(-27.952754798, -8, -16), x_dir=(0, 0.8858914010009324, -0.4638926876257108), z_dir=(0, -0.4638926876257108, -0.8858914010009324))) as chamfer2_piece_35_section:
        Polygon((8 + CHAMFER2_SIZE, 0), (8, CHAMFER2_SIZE), (8, 0), align=None)
    chamfer2_piece_35 = revolve(axis=Axis((-27.952754798, -8, -16), (1, 0, 0)), revolution_arc=117.638582209, mode=Mode.PRIVATE)
    chamfer2_piece_35 = split(chamfer2_piece_35, bisect_by=Plane(origin=(-27.952754798, 0, -16), z_dir=(0, -1, 0)), keep=Keep.TOP, mode=Mode.PRIVATE)
    add(chamfer2_piece_35, mode=Mode.SUBTRACT)
    with BuildSketch(Plane(origin=(27.787245202, -8, -16), x_dir=(0, 0.8858914010009324, -0.4638926876257108), z_dir=(0, -0.4638926876257108, -0.8858914010009324))) as chamfer2_piece_36_section:
        Polygon((8, -CHAMFER2_SIZE), (8 + CHAMFER2_SIZE, 0), (8, 0), align=None)
    chamfer2_piece_36 = revolve(axis=Axis((27.787245202, -8, -16), (1, 0, 0)), revolution_arc=117.638582209, mode=Mode.PRIVATE)
    chamfer2_piece_36 = split(chamfer2_piece_36, bisect_by=Plane(origin=(27.787245202, 0, -16), z_dir=(0, -1, 0)), keep=Keep.TOP, mode=Mode.PRIVATE)
    add(chamfer2_piece_36, mode=Mode.SUBTRACT)


solid = part.part
